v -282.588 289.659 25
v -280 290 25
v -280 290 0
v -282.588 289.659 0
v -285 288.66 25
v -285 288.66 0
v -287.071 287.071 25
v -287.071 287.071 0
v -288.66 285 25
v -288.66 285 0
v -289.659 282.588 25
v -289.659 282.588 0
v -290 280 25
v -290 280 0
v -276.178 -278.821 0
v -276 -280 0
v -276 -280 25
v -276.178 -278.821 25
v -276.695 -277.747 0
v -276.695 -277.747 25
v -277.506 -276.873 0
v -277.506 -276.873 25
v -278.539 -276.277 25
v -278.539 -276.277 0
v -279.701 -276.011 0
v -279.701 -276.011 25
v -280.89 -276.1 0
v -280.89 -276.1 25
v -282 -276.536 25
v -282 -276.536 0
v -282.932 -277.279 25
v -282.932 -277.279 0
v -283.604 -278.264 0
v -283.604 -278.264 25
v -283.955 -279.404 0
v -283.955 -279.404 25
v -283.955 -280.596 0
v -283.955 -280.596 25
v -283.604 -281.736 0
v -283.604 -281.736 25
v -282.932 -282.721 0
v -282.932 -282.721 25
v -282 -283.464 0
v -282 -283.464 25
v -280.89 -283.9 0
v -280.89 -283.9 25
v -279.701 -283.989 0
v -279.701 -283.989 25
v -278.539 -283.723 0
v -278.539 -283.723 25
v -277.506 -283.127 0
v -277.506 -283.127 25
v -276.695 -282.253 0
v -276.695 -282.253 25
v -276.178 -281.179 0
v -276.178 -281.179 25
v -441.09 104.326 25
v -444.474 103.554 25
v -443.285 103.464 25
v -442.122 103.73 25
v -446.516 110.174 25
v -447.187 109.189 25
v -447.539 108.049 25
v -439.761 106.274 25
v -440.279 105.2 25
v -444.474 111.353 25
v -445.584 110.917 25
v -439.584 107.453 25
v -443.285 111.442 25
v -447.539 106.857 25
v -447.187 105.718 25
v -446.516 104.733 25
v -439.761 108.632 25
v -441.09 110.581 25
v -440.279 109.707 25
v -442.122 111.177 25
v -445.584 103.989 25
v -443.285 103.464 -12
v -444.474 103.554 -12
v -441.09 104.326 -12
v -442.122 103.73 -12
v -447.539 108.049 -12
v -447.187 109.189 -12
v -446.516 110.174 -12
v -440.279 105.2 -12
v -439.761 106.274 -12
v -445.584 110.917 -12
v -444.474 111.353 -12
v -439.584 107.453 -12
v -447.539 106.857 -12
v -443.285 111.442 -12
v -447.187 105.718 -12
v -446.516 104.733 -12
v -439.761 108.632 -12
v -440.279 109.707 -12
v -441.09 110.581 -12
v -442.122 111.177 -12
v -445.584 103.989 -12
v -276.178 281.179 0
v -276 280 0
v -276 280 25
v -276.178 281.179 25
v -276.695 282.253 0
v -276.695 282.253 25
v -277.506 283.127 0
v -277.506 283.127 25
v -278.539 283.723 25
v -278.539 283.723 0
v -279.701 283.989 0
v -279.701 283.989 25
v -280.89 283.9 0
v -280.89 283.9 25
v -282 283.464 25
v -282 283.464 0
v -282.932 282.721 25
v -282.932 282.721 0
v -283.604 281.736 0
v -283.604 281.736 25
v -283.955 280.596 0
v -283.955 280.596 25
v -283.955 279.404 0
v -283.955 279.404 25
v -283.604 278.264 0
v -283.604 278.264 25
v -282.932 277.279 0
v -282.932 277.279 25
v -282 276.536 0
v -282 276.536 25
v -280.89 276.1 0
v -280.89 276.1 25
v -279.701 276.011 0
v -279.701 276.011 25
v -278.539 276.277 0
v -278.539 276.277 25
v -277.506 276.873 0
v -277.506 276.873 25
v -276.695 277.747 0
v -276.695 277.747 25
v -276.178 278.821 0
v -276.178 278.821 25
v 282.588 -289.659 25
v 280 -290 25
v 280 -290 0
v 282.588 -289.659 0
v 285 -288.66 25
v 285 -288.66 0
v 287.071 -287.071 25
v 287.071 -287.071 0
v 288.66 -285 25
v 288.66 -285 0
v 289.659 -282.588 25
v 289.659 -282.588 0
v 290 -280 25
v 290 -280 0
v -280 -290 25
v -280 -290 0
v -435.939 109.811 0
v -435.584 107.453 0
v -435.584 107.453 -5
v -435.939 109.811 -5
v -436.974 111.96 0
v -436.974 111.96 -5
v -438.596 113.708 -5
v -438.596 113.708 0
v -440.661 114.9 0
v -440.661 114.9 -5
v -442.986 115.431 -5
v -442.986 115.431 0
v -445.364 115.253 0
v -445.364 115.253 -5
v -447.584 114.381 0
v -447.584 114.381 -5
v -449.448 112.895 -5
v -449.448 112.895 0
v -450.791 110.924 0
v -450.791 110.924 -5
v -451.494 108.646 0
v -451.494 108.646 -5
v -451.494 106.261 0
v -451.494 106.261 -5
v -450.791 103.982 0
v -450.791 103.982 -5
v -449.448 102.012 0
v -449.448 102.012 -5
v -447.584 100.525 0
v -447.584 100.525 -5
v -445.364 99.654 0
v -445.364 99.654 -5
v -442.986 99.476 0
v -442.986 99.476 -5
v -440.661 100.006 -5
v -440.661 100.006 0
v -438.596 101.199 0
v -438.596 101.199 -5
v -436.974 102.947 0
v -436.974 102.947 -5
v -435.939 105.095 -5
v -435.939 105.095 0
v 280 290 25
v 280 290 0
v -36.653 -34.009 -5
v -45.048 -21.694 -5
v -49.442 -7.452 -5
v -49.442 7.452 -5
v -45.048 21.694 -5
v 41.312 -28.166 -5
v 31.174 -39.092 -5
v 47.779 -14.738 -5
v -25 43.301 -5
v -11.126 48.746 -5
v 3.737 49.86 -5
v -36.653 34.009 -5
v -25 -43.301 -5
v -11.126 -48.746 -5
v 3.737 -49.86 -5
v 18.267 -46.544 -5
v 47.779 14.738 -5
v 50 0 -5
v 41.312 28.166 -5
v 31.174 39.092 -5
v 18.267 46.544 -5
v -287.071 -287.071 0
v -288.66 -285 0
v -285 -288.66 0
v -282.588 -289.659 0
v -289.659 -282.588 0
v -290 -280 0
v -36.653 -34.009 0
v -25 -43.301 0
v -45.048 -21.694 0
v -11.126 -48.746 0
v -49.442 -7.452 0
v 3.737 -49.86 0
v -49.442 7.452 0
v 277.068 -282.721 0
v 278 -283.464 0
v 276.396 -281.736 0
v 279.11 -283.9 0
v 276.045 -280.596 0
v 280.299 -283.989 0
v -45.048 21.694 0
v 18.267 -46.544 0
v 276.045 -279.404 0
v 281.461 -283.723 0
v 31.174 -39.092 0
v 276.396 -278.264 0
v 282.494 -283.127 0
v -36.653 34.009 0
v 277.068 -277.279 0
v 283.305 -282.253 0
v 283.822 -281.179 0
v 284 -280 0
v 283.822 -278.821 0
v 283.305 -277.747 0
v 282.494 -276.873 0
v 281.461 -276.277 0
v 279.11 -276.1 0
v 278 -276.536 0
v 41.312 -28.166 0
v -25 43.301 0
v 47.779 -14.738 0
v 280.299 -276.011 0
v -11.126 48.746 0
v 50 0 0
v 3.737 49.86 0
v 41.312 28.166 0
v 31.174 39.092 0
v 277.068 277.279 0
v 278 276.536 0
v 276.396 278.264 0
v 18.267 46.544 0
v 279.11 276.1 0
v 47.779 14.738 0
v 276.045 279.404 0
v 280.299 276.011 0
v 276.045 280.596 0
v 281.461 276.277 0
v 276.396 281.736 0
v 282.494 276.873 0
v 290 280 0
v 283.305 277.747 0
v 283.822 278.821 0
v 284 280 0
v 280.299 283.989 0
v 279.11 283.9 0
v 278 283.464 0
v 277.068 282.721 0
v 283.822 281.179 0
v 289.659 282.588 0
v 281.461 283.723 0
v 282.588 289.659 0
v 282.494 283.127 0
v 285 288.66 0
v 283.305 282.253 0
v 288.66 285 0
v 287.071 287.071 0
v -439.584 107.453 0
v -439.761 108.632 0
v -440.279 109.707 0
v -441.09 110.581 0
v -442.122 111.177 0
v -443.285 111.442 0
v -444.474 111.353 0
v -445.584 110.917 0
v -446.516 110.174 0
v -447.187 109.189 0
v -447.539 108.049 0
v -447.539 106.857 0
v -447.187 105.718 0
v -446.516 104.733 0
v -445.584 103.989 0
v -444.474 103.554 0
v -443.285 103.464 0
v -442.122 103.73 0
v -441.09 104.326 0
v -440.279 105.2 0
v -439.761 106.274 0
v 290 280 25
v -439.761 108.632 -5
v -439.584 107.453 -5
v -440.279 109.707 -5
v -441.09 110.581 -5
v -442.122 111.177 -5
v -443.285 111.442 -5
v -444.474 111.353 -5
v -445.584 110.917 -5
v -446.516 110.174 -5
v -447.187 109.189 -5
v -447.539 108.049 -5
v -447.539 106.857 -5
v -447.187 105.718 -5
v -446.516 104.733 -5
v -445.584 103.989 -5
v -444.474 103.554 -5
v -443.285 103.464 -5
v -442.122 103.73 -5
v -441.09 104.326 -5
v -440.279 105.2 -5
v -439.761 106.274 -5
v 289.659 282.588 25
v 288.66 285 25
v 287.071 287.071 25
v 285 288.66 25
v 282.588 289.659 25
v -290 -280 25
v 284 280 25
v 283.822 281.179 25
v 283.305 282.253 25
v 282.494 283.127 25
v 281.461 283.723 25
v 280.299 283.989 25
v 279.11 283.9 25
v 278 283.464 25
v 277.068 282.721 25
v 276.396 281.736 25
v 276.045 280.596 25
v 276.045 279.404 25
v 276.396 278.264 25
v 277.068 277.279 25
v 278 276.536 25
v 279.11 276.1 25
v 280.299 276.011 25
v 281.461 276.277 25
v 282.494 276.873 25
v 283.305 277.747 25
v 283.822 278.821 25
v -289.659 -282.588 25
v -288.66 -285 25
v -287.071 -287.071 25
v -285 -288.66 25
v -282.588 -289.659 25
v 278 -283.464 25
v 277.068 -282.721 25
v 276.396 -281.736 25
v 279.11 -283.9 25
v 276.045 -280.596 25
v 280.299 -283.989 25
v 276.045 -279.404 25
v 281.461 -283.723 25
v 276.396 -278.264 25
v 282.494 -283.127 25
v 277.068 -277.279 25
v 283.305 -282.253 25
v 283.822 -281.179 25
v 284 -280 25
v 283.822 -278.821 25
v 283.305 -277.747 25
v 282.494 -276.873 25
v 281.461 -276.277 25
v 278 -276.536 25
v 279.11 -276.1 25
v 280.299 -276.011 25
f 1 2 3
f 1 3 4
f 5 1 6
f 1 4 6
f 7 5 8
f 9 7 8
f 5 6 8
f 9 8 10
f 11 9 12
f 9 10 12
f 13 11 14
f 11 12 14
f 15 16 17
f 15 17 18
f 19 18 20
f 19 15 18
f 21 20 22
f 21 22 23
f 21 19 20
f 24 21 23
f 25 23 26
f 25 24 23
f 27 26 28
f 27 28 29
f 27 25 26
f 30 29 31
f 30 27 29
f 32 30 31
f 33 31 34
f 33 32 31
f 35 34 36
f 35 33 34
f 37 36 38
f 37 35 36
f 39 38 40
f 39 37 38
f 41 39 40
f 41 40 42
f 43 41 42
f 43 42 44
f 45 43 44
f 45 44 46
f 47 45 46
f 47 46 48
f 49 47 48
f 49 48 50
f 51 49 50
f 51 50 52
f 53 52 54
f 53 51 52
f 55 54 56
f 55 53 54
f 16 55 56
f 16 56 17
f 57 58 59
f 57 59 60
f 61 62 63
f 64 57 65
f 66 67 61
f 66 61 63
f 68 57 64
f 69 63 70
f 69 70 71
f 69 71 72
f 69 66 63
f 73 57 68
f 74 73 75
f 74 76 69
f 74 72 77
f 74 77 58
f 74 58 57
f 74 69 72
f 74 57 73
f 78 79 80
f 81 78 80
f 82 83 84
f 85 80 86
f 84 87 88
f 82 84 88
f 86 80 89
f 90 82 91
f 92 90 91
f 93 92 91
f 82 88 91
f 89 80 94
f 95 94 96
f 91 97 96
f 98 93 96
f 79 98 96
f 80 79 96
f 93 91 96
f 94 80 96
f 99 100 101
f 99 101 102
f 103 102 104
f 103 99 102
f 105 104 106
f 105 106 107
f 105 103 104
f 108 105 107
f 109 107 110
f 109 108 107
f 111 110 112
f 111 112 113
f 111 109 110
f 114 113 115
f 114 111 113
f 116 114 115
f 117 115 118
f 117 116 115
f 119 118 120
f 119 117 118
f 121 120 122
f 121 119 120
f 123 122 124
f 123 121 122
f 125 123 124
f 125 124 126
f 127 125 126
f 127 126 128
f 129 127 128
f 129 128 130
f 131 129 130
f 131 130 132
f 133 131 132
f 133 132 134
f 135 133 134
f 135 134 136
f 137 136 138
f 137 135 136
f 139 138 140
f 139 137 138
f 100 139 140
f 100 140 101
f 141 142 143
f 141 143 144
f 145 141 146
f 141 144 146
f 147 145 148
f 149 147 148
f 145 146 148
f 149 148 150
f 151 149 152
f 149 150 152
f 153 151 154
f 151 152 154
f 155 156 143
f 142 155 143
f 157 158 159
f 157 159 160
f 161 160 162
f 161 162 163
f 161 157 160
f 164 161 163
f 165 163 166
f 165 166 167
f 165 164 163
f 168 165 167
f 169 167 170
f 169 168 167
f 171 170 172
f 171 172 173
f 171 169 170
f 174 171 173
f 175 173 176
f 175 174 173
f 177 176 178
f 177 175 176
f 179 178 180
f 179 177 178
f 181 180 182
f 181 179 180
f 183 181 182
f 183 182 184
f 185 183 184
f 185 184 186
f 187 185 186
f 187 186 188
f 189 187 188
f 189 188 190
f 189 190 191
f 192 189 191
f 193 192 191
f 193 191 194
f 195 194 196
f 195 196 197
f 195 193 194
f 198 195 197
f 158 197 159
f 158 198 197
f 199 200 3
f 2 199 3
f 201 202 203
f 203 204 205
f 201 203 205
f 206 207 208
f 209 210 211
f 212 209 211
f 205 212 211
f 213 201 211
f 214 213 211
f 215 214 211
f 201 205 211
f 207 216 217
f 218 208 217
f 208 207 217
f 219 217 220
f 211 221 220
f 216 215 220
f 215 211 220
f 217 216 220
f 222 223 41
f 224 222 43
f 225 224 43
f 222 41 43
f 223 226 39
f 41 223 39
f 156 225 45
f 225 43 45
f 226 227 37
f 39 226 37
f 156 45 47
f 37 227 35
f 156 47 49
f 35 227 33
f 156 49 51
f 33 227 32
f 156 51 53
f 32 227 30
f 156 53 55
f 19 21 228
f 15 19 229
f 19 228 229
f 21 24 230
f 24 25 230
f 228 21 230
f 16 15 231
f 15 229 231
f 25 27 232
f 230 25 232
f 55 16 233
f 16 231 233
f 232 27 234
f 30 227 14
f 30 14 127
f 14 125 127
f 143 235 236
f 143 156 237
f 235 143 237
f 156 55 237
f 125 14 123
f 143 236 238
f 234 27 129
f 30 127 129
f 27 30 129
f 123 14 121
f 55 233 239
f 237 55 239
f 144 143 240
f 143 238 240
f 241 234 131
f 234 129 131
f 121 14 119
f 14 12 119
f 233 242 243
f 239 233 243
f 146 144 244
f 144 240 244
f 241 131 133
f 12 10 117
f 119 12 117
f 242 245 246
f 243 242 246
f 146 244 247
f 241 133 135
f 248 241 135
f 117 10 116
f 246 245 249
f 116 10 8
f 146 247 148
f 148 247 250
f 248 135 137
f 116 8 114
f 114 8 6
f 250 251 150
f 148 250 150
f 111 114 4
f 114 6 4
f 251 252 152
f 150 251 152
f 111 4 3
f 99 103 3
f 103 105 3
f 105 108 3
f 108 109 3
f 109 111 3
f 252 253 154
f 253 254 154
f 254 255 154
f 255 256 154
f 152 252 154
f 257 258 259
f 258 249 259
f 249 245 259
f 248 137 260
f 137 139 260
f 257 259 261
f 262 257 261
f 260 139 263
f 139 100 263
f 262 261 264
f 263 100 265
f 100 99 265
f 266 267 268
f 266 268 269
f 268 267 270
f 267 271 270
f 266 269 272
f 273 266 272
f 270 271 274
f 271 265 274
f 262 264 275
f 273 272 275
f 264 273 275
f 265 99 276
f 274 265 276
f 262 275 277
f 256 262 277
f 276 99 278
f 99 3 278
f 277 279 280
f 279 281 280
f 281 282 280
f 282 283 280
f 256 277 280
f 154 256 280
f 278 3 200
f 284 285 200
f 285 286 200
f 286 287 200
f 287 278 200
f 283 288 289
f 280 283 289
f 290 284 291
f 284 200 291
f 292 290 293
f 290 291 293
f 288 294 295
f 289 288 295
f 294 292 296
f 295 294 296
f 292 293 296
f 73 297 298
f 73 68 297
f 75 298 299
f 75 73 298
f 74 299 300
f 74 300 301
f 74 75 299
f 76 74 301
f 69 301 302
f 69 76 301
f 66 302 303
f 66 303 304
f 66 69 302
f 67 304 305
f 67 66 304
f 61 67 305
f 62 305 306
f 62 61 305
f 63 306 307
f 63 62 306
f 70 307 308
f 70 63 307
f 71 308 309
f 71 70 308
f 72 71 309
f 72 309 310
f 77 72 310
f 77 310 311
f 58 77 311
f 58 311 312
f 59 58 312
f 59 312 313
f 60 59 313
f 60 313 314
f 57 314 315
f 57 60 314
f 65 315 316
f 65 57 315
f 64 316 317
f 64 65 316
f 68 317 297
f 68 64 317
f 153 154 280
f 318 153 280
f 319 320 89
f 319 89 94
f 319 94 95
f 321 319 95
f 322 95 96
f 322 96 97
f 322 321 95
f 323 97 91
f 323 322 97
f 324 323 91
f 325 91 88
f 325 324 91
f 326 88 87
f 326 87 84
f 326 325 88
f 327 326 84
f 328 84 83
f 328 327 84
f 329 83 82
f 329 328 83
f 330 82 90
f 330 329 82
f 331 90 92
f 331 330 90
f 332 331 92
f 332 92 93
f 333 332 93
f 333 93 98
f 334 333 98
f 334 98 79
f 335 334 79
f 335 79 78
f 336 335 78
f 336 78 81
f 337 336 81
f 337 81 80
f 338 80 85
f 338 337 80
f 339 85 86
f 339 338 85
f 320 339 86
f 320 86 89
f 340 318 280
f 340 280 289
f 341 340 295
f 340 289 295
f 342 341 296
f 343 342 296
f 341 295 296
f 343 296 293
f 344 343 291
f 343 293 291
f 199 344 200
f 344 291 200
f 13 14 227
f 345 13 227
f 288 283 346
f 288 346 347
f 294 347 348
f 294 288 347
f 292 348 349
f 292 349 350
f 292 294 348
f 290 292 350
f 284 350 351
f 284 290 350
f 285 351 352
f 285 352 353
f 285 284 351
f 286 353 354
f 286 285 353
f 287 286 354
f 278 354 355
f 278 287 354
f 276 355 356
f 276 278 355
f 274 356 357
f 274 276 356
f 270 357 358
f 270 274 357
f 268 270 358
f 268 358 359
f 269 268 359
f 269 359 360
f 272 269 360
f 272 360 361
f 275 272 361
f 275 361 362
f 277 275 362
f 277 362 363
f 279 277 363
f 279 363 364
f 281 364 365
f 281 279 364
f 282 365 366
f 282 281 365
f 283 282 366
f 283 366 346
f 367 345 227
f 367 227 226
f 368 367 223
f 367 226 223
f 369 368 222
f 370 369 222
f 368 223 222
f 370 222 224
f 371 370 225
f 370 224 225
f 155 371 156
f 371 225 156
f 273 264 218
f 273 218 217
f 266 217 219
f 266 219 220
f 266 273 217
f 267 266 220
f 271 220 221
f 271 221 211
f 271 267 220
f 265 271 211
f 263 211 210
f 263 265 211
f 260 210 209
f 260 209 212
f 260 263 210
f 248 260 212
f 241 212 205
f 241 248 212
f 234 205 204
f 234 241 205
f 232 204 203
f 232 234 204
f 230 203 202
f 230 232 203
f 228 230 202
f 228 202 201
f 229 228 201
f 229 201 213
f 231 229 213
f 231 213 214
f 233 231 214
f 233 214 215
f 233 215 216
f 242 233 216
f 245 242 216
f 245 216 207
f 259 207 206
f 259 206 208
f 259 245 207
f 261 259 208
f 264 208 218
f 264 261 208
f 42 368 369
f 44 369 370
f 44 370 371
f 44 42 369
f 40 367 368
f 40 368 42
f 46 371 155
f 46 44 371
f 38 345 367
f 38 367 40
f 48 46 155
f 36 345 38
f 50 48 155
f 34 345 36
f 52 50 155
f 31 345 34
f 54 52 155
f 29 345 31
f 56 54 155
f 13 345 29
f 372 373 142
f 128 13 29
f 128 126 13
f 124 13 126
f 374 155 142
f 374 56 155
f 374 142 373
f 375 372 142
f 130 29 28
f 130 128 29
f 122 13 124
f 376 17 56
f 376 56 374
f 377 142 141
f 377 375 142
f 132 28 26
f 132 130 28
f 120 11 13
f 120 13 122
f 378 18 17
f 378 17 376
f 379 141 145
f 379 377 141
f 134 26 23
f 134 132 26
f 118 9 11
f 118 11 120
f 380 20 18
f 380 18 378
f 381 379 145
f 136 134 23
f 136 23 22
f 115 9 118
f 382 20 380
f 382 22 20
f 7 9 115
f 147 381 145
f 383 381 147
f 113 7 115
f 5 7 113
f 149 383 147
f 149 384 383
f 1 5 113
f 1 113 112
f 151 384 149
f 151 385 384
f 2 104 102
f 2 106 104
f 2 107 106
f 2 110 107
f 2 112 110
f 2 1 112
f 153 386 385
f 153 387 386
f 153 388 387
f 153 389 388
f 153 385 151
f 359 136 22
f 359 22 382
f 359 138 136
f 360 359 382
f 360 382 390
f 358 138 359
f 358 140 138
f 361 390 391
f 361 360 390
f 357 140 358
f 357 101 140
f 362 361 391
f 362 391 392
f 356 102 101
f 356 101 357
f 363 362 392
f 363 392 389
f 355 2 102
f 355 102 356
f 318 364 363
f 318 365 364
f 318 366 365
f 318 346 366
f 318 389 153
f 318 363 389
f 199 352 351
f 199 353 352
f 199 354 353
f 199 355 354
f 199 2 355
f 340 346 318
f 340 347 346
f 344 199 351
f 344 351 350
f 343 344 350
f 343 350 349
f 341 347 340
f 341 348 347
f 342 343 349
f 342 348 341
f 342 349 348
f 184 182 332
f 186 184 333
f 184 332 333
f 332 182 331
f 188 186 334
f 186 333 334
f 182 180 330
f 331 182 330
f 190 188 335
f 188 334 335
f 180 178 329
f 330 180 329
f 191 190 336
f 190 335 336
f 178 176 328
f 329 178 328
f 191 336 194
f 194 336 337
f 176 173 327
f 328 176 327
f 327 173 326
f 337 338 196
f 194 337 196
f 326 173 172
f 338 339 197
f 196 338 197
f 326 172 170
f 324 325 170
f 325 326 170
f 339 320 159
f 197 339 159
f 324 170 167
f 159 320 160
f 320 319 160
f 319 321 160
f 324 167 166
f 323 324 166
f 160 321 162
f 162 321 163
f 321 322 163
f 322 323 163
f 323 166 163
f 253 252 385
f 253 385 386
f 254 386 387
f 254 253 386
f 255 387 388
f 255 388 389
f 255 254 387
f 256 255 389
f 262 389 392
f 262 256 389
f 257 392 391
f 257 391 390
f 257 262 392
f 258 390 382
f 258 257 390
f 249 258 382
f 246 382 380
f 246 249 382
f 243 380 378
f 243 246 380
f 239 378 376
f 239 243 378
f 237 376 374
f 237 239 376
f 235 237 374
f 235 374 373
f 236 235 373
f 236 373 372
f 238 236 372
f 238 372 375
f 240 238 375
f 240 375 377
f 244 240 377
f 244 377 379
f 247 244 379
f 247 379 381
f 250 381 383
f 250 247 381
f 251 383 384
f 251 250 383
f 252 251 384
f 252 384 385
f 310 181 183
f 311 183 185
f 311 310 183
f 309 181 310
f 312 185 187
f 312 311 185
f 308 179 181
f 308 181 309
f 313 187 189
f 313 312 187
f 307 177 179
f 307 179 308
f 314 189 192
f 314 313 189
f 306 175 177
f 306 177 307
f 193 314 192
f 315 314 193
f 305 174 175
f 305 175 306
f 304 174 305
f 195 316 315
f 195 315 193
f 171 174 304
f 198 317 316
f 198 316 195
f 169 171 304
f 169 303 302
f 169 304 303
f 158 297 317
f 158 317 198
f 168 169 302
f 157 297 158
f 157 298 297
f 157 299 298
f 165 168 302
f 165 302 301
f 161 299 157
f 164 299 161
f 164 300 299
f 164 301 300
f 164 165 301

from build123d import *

# Parameters (mm, degrees)
F0_R          = 4
F0_R_2        = 50
F1_DEPTH      = 25
F2_R          = 4
F3_DEPTH      = 25
F3_DEPTH_BACK = 12
F2_R_2        = 8
F4_DEPTH      = 5
F5_DEPTH      = 5


with BuildPart() as f1:
    # F0 (on Top) → F1 (new body)
    with BuildSketch(Plane.XY):
        with BuildLine():
            ThreePointArc((290, 280), (287.071068, 287.071068), (280, 290))
            Line((280, 290), (-280, 290))
            ThreePointArc((-280, 290), (-287.071068, 287.071068), (-290, 280))
            Line((-290, 280), (-290, -280))
            ThreePointArc((-290, -280), (-287.071068, -287.071068), (-280, -290))
            Line((-280, -290), (280, -290))
            ThreePointArc((280, -290), (287.071068, -287.071068), (290, -280))
            Line((290, -280), (290, 280))
        make_face()
        with Locations((-280, -280)):
            Circle(F0_R, mode=Mode.SUBTRACT)
        with Locations((280, -280)):
            Circle(F0_R, mode=Mode.SUBTRACT)
        with Locations((-280, 280)):
            Circle(F0_R, mode=Mode.SUBTRACT)
        Circle(F0_R_2, mode=Mode.SUBTRACT)
        with Locations((280, 280)):
            Circle(F0_R, mode=Mode.SUBTRACT)
        Circle(F0_R_2)
    extrude(amount=F1_DEPTH)

    # F0 (on Top) → F5 (join)
    with BuildSketch(Plane.XY):
        Circle(F0_R_2)
    extrude(amount=-F5_DEPTH)


with BuildPart() as f3:
    # F2 (on Top) → F3 (new body, two sides)
    with BuildSketch(Plane.XY) as f3_sk:
        with Locations((-443.583548, 107.453264)):
            Circle(F2_R)
    extrude(amount=F3_DEPTH)
    extrude(f3_sk.sketch, amount=-F3_DEPTH_BACK)

    # F2 (on Top) → F4 (join)
    with BuildSketch(Plane.XY):
        with Locations((-443.583548, 107.453264)):
            Circle(F2_R_2)
        with Locations((-443.583548, 107.453264)):
            Circle(F2_R, mode=Mode.SUBTRACT)
    extrude(amount=-F4_DEPTH)


solid = Compound([f1.part, f3.part])
